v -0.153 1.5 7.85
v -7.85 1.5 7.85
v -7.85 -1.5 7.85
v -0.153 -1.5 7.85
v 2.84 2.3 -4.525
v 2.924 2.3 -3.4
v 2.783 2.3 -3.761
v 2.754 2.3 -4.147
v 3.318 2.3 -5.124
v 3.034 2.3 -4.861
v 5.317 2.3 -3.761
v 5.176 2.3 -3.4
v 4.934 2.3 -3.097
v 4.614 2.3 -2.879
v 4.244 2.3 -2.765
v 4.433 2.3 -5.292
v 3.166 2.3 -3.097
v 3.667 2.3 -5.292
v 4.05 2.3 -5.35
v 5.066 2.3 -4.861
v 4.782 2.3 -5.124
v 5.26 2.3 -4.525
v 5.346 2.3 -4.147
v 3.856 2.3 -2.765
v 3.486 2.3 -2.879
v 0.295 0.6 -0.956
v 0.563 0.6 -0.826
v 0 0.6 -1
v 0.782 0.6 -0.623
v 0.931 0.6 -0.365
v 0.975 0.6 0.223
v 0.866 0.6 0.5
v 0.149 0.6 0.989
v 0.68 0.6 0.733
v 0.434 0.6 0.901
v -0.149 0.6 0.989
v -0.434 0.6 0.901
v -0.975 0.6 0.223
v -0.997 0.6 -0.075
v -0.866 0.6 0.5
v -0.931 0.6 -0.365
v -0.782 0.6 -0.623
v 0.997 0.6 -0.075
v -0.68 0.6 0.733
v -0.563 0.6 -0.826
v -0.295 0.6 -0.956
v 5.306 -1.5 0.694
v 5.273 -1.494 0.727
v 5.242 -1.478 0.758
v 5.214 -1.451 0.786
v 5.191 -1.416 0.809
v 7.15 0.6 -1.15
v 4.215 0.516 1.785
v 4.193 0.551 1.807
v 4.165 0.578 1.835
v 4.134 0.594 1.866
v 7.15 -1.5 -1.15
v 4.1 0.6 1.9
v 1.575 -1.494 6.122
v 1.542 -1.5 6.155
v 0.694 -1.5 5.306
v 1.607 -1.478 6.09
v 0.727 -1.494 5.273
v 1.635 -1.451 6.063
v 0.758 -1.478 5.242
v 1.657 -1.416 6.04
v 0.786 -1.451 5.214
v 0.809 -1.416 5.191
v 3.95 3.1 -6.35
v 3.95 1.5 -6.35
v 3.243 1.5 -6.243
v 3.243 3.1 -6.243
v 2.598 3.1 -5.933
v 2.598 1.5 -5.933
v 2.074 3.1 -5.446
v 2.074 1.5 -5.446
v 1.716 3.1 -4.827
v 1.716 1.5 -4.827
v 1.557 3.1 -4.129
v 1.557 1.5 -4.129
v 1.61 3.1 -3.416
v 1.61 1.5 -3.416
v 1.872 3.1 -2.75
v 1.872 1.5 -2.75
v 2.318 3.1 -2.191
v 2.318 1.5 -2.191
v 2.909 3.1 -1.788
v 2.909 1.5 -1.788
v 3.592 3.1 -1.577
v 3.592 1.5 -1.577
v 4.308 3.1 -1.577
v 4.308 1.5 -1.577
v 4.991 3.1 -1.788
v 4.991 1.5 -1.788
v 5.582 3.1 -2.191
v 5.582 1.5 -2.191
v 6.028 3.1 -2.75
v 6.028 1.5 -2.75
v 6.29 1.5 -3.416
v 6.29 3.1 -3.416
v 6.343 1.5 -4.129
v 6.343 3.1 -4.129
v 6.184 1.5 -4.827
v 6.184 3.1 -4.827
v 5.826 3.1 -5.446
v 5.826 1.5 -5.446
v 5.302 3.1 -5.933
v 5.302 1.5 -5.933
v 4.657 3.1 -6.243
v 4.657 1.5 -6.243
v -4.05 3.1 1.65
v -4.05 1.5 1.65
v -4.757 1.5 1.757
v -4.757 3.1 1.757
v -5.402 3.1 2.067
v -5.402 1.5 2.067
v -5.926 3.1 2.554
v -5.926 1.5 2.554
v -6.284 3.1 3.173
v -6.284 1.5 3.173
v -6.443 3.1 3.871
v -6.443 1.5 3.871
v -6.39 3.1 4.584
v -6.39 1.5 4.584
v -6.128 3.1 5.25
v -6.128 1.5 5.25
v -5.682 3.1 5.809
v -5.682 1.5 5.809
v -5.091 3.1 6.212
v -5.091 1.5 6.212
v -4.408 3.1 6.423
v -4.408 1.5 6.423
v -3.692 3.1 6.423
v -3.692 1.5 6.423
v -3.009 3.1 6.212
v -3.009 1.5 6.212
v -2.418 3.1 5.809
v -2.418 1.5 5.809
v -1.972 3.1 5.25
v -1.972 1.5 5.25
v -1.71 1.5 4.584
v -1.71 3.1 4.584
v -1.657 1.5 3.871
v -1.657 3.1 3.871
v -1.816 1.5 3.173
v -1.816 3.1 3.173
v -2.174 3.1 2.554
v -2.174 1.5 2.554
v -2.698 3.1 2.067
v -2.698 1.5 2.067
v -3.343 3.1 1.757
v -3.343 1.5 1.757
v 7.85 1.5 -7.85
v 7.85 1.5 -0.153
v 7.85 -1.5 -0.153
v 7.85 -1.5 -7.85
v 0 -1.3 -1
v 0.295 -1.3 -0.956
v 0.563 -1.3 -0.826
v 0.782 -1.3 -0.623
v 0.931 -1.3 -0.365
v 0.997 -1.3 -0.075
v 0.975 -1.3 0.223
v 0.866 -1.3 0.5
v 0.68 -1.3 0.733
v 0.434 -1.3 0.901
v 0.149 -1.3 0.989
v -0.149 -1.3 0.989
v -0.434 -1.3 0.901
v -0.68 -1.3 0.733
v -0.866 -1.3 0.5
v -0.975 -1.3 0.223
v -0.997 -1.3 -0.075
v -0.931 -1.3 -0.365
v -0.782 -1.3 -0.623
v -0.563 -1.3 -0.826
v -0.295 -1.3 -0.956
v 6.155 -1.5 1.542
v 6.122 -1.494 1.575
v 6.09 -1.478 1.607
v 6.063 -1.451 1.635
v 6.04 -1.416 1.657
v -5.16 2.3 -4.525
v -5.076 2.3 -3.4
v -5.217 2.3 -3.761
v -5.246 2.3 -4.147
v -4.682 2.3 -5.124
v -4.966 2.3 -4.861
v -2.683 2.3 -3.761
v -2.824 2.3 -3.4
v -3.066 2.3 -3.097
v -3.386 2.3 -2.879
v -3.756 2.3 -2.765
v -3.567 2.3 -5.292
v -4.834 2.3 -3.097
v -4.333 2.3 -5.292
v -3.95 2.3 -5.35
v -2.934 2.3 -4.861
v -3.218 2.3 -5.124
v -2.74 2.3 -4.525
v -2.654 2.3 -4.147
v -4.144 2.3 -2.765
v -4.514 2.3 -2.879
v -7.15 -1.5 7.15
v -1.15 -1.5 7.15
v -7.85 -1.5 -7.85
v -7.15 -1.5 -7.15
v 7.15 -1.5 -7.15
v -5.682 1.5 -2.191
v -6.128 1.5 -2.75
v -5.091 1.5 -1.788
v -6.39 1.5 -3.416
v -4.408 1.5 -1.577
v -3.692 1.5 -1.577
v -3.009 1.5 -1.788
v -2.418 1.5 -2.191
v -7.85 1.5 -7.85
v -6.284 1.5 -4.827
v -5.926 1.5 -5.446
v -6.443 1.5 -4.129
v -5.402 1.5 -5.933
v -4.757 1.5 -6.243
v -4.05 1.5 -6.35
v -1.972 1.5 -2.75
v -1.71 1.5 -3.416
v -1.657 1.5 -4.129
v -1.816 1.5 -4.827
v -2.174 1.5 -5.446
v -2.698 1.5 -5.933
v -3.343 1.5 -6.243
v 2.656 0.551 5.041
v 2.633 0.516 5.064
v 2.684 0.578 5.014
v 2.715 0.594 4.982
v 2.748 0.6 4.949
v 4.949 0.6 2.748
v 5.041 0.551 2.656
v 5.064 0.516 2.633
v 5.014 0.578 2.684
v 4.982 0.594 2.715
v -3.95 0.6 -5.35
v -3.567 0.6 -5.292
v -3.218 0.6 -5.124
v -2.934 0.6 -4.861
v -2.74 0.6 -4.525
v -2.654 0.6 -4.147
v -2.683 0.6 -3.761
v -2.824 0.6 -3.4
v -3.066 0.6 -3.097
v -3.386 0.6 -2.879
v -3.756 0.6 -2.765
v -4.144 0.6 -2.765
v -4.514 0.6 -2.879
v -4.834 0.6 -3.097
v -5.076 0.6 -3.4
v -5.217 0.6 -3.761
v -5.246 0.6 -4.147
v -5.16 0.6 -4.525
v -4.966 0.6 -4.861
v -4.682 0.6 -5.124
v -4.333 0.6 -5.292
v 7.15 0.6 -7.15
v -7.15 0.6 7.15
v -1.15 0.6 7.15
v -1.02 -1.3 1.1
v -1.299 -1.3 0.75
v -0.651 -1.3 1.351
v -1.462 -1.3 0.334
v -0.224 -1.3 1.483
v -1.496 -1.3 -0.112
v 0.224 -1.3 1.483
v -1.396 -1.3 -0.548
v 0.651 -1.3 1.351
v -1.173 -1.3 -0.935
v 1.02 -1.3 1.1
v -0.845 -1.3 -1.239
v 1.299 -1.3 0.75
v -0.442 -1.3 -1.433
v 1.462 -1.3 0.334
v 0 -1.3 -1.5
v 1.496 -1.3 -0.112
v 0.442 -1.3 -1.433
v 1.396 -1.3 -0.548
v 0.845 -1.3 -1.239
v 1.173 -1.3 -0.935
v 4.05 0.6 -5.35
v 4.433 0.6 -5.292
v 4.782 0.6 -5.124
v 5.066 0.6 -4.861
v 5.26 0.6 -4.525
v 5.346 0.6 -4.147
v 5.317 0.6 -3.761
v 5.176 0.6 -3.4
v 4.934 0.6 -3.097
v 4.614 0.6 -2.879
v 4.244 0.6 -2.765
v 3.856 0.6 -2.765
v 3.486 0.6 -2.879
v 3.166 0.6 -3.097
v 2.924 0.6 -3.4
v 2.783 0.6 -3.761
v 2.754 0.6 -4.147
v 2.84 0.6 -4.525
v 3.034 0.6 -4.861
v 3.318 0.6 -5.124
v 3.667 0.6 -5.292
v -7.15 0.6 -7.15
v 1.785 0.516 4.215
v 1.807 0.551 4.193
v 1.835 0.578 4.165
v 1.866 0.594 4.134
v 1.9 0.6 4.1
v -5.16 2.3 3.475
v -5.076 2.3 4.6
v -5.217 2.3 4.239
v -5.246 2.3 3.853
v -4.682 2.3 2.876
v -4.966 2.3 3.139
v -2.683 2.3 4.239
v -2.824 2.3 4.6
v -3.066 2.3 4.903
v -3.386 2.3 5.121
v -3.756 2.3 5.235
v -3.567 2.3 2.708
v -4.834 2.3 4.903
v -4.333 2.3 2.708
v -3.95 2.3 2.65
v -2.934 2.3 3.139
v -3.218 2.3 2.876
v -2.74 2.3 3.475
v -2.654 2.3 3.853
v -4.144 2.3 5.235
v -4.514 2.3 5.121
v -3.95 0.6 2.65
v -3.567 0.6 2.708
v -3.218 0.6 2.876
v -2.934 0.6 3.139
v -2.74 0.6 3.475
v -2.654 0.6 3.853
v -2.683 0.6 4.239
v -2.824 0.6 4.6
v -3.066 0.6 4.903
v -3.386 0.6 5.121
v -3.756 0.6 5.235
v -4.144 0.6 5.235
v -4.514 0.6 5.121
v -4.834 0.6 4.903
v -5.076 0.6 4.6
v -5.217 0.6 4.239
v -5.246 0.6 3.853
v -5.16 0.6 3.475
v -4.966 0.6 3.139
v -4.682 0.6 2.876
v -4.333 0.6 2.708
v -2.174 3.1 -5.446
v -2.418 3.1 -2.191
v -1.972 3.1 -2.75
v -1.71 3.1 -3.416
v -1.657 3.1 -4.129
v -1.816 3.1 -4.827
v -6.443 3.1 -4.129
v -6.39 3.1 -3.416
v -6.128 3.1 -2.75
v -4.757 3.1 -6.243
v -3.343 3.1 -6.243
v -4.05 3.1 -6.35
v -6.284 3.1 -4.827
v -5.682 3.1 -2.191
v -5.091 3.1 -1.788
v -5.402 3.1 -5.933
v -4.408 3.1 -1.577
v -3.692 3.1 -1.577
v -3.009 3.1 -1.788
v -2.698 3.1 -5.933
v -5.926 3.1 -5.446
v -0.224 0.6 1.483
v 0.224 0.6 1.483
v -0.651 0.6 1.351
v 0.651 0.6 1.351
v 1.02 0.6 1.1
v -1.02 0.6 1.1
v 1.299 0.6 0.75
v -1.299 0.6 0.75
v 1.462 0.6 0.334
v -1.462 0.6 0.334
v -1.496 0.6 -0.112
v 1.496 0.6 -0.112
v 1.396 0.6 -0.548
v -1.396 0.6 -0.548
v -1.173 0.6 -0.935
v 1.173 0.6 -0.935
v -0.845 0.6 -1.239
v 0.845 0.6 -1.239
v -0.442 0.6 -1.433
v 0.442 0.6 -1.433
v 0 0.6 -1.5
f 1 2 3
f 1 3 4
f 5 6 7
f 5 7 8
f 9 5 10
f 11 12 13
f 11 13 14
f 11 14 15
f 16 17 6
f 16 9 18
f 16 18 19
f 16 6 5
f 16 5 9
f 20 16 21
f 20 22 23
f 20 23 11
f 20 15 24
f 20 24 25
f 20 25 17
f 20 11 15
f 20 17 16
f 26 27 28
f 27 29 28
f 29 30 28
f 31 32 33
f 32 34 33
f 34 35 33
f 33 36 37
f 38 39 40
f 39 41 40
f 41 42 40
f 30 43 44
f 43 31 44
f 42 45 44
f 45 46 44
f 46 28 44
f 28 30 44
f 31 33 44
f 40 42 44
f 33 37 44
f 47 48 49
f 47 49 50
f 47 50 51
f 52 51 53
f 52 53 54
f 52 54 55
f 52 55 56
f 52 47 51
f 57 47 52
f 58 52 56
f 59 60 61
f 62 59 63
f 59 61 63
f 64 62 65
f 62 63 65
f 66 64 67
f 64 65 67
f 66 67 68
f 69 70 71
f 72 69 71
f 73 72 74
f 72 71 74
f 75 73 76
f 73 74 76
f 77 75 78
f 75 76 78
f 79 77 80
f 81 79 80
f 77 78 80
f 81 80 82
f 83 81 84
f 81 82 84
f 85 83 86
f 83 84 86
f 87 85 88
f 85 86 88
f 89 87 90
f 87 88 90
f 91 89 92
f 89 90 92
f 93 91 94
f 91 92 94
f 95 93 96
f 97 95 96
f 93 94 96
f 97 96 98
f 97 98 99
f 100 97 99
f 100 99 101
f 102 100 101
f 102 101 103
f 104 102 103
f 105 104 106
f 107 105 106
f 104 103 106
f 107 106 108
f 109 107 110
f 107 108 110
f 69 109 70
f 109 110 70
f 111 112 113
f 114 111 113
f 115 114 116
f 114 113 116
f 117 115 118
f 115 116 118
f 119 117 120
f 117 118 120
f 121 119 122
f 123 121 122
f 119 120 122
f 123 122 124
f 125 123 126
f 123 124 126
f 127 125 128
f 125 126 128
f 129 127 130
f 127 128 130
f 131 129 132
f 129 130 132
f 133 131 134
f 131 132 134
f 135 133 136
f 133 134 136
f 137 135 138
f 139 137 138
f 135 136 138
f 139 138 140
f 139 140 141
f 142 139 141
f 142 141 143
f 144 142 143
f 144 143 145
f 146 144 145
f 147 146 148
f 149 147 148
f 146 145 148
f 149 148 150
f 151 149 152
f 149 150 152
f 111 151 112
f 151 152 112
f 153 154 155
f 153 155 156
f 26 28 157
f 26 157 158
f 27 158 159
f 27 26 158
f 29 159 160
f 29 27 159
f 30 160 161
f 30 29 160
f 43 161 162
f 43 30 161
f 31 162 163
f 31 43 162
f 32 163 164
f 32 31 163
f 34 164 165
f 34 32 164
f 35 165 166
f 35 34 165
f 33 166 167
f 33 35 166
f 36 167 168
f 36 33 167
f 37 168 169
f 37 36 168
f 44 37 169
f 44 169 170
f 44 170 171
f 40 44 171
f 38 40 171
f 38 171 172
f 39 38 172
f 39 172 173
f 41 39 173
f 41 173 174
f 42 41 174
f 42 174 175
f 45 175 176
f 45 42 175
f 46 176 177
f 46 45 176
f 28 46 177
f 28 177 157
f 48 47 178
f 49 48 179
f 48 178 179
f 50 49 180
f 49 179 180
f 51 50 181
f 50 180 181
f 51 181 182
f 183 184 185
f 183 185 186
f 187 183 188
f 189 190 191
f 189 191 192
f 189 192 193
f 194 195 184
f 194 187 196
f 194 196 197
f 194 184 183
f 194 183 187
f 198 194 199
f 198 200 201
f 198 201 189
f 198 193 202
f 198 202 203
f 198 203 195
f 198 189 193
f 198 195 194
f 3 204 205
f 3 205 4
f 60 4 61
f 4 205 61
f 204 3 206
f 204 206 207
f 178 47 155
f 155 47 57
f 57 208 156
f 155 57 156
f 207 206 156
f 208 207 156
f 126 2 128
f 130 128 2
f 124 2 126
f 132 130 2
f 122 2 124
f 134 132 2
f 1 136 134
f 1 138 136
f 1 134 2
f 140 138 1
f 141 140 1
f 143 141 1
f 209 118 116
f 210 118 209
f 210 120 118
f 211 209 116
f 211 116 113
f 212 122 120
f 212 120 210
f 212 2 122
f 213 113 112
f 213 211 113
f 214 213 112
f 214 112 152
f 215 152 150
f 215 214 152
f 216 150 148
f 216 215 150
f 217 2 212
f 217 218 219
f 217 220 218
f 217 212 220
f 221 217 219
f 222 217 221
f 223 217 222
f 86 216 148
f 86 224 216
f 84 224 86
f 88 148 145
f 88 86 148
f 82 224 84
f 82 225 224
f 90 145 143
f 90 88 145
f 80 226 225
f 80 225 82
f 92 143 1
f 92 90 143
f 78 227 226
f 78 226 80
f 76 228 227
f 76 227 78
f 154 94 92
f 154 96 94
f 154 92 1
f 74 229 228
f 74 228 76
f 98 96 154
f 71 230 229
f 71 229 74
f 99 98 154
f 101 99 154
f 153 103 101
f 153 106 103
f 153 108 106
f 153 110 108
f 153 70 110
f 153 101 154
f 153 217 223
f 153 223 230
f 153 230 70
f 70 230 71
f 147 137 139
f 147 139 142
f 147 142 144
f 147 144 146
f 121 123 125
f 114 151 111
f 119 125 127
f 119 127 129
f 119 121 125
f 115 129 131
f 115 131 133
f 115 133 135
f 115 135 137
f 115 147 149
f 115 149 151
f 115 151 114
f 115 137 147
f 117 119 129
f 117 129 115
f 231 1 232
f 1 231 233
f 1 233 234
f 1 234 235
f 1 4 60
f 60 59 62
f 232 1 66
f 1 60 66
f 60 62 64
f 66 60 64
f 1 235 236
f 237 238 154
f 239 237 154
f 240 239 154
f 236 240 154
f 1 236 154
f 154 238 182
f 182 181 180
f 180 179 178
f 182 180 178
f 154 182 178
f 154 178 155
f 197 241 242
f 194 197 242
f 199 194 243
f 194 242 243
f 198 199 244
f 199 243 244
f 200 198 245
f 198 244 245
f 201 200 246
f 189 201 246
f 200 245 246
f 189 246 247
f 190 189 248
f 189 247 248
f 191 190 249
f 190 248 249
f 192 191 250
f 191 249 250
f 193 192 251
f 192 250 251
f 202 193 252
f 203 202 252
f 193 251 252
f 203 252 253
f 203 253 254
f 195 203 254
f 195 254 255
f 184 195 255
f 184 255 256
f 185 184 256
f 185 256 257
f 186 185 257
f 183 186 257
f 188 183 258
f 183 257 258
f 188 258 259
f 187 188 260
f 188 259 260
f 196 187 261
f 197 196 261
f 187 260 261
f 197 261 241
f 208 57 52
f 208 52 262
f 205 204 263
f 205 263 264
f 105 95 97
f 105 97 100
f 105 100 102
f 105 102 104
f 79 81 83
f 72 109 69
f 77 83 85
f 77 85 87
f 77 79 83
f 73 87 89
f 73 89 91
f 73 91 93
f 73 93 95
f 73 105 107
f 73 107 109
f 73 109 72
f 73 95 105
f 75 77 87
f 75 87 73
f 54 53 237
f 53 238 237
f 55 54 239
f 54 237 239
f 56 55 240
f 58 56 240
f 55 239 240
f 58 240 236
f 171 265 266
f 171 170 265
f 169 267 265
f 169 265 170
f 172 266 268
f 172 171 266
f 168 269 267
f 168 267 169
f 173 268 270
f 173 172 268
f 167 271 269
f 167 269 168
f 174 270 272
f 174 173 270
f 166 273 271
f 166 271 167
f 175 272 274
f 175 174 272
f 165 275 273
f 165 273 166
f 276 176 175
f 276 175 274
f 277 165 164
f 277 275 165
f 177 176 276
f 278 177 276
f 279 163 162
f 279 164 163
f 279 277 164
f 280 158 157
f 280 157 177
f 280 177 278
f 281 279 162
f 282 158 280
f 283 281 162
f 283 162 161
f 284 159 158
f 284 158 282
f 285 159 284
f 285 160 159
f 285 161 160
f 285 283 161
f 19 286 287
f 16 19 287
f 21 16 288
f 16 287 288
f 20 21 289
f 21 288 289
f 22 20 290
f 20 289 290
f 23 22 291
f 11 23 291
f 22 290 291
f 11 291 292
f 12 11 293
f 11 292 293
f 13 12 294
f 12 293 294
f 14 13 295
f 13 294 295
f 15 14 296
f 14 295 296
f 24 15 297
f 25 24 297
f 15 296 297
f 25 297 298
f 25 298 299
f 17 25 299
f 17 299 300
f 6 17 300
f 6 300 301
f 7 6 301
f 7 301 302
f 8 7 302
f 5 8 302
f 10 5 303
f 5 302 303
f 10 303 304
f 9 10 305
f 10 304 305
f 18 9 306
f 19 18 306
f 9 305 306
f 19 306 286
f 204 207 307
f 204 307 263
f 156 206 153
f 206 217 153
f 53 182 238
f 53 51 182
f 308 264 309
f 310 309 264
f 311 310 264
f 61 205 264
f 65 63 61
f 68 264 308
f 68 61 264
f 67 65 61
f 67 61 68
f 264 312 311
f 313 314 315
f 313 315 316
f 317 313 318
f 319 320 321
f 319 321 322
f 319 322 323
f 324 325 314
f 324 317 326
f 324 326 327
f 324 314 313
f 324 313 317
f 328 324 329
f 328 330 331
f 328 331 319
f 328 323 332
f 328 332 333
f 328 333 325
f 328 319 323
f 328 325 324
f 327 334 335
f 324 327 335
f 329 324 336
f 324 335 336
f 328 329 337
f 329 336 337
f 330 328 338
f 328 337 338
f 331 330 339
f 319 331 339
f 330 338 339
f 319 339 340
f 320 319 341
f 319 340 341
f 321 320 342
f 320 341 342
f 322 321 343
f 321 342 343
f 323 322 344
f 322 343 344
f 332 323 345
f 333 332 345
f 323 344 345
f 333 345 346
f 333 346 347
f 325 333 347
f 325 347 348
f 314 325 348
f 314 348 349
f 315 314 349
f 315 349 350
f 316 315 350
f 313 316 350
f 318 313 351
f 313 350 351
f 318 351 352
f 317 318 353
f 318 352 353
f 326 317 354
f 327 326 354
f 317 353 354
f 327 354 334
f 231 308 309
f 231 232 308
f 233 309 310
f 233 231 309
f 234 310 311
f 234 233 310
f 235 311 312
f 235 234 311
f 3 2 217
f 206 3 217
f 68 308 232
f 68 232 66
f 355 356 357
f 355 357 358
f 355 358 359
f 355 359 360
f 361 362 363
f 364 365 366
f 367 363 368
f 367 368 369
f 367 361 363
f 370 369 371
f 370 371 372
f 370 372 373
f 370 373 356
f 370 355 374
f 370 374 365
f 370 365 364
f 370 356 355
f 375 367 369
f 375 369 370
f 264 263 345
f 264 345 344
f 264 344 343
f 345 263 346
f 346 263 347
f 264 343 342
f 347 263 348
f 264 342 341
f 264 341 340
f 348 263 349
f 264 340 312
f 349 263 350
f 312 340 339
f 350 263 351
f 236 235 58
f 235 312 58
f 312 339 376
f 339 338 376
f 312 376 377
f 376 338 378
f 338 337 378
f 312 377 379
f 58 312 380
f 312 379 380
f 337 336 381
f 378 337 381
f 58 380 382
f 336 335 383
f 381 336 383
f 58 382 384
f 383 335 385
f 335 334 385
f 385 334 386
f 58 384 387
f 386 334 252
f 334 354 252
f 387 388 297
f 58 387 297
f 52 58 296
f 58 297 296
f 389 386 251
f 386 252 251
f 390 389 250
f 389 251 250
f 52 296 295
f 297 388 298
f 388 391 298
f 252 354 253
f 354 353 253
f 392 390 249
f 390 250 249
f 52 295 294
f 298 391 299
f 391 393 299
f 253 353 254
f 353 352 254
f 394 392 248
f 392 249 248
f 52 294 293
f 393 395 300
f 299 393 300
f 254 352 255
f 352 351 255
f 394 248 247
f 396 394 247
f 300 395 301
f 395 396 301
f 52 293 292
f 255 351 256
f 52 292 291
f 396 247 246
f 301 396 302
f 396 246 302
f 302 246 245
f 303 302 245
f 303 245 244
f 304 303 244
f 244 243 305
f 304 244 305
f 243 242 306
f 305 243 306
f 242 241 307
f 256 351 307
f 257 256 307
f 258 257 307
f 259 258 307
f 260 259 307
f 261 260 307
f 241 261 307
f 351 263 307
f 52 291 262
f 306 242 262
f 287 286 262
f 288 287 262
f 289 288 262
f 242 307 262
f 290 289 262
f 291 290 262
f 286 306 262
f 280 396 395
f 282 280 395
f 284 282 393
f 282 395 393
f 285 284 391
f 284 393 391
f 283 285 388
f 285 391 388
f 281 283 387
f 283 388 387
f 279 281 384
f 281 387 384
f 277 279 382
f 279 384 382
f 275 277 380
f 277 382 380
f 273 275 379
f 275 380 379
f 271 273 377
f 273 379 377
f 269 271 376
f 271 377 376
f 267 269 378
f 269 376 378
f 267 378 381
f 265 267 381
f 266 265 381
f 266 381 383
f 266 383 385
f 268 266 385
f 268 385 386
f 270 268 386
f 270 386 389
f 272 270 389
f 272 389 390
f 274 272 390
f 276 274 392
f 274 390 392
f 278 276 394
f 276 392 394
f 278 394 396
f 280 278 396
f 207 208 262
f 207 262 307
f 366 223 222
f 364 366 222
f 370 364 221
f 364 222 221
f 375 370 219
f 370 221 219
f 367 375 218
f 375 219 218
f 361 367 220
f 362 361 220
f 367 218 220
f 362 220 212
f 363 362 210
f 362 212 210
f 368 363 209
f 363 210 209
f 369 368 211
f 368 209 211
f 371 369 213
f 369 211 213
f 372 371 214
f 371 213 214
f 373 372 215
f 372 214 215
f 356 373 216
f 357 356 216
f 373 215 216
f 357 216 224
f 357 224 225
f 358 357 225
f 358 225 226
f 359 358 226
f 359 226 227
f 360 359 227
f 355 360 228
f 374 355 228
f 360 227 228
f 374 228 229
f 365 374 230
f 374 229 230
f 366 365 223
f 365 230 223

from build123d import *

# Parameters (mm, degrees)
SKETCH1_W               = 15.7
SKETCH1_H               = 15.7
BOSS_EXTRUDE1_DEPTH     = 1.5
SKETCH3_R               = 2.4
BOSS_EXTRUDE2_DEPTH     = 1.6
CUT_EXTRUDE1_DEPTH      = 2.1
CUT_EXTRUDE2_DEPTH      = 13.016863151
LPATTERN2_COUNT         = 2
LPATTERN2_PITCH         = 8
LPATTERN2_COUNT_DIR2    = 2
LPATTERN2_PITCH_DIR2    = 8
SKETCH7_R               = 1.5
SKETCH7_R_2             = 1
BOSS_EXTRUDE3_DEPTH     = 1.9
SKETCH10_R              = 1.3
CUT_EXTRUDE3_DEPTH      = 1.7
LPATTERN3_COUNT         = 2
LPATTERN3_PITCH         = 8
LPATTERN3_COUNT_DIR2    = 2
LPATTERN3_PITCH_DIR2    = 8
CUT_EXTRUDE4_DEPTH      = 17.832145471
CUT_EXTRUDE4_DEPTH_BACK = 1.7
FILLET1_R               = 0.2


with BuildPart() as part:
    # Sketch1 → Boss-Extrude1 (new, symmetric)
    with BuildSketch(Plane(origin=(0, 0, 0), x_dir=(1, 0, 0), z_dir=(0, 1, 0))):
        Rectangle(SKETCH1_W, SKETCH1_H)
    extrude(amount=BOSS_EXTRUDE1_DEPTH, both=True)

    # Sketch3 → Boss-Extrude2 (add)
    with BuildSketch(Plane(origin=(0, 1.5, 0), x_dir=(1, 0, 0), z_dir=(0, 1, 0))):
        with Locations(Location((3.95, 3.95, 0), (0, 0, 90))):
            Circle(SKETCH3_R)
    boss_extrude2 = extrude(amount=BOSS_EXTRUDE2_DEPTH)

    # Sketch4 → Cut-Extrude1 (cut)
    with BuildSketch(Plane.XZ.offset(1.5)):
        Polygon((-7.15, 7.15), (-1.15, 7.15), (7.15, -1.15), (7.15, -7.15), (-7.15, -7.15), align=None)
    extrude(amount=-CUT_EXTRUDE1_DEPTH, mode=Mode.SUBTRACT)

    # Sketch6 → Cut-Extrude2 (cut, through all)
    with BuildSketch(Plane.XZ.offset(1.5)):
        Polygon((-0.152943725, 7.85), (7.85, -0.152943725), (7.85, 7.85), align=None)
    extrude(amount=-CUT_EXTRUDE2_DEPTH, mode=Mode.SUBTRACT)

    # LPattern2: Boss-Extrude2 2 × 2, 1 skipped
    with Locations(*[(-i * LPATTERN2_PITCH, 0, j * LPATTERN2_PITCH_DIR2) for i in range(LPATTERN2_COUNT) for j in range(LPATTERN2_COUNT_DIR2) if (i, j) not in ((0, 0), (0, 1))]):
        add(boss_extrude2)

    # Sketch7 → Boss-Extrude3 (add)
    with BuildSketch(Plane.XZ.offset(-0.6)):
        with Locations(Location((0, 0, 0), (0, 0, 270))):
            Circle(SKETCH7_R)
        with Locations(Location((0, 0, 0), (0, 0, 270))):
            Circle(SKETCH7_R_2, mode=Mode.SUBTRACT)
    extrude(amount=BOSS_EXTRUDE3_DEPTH)

    # Sketch10 → Cut-Extrude3 (cut)
    with BuildSketch(Plane.XZ.offset(-0.6)):
        with Locations(Location((-3.95, 3.95, 0), (0, 0, 270))):
            Circle(SKETCH10_R)
    cut_extrude3 = extrude(amount=-CUT_EXTRUDE3_DEPTH, mode=Mode.SUBTRACT)

    # LPattern3: Cut-Extrude3 2 × 2, 1 skipped
    with Locations(*[(j * LPATTERN3_PITCH_DIR2, 0, -i * LPATTERN3_PITCH) for i in range(LPATTERN3_COUNT) for j in range(LPATTERN3_COUNT_DIR2) if (i, j) not in ((0, 0), (0, 1))]):
        add(cut_extrude3, mode=Mode.SUBTRACT)

    # Sketch11 → Cut-Extrude4 (cut, two sides: drawn at the far end of the back side and taken through both)
    with BuildSketch(Plane(origin=(3.848528137, 0, 3.848528137), x_dir=(0.7071067811865478, 0, -0.7071067811865475), z_dir=(0.7071067811865475, 0, 0.7071067811865478)).offset(-CUT_EXTRUDE4_DEPTH_BACK)):
        Polygon((-26.389939678, -34.02340546), (-3.158935778, -1.5), (-1.658935778, 0.6), (1.658935778, 0.6), (3.158935778, -1.5), (26.389939678, -34.02340546), (26.389939678, -113.959666192), (-26.389939678, -113.959666192), align=None)
    extrude(amount=CUT_EXTRUDE4_DEPTH + CUT_EXTRUDE4_DEPTH_BACK, mode=Mode.SUBTRACT)

    # Fillet1
    fillet1_edges = [part.edges().sort_by_distance(p)[0] for p in [
        (4.597308807, 0.6, 2.251219331),
        (1.190559159, -1.5, 5.657968978),
        (5.657968978, -1.5, 1.190559159),
        (2.251219331, 0.6, 4.597308807),
    ]]
    fillet(fillet1_edges, radius=FILLET1_R)


solid = part.part
